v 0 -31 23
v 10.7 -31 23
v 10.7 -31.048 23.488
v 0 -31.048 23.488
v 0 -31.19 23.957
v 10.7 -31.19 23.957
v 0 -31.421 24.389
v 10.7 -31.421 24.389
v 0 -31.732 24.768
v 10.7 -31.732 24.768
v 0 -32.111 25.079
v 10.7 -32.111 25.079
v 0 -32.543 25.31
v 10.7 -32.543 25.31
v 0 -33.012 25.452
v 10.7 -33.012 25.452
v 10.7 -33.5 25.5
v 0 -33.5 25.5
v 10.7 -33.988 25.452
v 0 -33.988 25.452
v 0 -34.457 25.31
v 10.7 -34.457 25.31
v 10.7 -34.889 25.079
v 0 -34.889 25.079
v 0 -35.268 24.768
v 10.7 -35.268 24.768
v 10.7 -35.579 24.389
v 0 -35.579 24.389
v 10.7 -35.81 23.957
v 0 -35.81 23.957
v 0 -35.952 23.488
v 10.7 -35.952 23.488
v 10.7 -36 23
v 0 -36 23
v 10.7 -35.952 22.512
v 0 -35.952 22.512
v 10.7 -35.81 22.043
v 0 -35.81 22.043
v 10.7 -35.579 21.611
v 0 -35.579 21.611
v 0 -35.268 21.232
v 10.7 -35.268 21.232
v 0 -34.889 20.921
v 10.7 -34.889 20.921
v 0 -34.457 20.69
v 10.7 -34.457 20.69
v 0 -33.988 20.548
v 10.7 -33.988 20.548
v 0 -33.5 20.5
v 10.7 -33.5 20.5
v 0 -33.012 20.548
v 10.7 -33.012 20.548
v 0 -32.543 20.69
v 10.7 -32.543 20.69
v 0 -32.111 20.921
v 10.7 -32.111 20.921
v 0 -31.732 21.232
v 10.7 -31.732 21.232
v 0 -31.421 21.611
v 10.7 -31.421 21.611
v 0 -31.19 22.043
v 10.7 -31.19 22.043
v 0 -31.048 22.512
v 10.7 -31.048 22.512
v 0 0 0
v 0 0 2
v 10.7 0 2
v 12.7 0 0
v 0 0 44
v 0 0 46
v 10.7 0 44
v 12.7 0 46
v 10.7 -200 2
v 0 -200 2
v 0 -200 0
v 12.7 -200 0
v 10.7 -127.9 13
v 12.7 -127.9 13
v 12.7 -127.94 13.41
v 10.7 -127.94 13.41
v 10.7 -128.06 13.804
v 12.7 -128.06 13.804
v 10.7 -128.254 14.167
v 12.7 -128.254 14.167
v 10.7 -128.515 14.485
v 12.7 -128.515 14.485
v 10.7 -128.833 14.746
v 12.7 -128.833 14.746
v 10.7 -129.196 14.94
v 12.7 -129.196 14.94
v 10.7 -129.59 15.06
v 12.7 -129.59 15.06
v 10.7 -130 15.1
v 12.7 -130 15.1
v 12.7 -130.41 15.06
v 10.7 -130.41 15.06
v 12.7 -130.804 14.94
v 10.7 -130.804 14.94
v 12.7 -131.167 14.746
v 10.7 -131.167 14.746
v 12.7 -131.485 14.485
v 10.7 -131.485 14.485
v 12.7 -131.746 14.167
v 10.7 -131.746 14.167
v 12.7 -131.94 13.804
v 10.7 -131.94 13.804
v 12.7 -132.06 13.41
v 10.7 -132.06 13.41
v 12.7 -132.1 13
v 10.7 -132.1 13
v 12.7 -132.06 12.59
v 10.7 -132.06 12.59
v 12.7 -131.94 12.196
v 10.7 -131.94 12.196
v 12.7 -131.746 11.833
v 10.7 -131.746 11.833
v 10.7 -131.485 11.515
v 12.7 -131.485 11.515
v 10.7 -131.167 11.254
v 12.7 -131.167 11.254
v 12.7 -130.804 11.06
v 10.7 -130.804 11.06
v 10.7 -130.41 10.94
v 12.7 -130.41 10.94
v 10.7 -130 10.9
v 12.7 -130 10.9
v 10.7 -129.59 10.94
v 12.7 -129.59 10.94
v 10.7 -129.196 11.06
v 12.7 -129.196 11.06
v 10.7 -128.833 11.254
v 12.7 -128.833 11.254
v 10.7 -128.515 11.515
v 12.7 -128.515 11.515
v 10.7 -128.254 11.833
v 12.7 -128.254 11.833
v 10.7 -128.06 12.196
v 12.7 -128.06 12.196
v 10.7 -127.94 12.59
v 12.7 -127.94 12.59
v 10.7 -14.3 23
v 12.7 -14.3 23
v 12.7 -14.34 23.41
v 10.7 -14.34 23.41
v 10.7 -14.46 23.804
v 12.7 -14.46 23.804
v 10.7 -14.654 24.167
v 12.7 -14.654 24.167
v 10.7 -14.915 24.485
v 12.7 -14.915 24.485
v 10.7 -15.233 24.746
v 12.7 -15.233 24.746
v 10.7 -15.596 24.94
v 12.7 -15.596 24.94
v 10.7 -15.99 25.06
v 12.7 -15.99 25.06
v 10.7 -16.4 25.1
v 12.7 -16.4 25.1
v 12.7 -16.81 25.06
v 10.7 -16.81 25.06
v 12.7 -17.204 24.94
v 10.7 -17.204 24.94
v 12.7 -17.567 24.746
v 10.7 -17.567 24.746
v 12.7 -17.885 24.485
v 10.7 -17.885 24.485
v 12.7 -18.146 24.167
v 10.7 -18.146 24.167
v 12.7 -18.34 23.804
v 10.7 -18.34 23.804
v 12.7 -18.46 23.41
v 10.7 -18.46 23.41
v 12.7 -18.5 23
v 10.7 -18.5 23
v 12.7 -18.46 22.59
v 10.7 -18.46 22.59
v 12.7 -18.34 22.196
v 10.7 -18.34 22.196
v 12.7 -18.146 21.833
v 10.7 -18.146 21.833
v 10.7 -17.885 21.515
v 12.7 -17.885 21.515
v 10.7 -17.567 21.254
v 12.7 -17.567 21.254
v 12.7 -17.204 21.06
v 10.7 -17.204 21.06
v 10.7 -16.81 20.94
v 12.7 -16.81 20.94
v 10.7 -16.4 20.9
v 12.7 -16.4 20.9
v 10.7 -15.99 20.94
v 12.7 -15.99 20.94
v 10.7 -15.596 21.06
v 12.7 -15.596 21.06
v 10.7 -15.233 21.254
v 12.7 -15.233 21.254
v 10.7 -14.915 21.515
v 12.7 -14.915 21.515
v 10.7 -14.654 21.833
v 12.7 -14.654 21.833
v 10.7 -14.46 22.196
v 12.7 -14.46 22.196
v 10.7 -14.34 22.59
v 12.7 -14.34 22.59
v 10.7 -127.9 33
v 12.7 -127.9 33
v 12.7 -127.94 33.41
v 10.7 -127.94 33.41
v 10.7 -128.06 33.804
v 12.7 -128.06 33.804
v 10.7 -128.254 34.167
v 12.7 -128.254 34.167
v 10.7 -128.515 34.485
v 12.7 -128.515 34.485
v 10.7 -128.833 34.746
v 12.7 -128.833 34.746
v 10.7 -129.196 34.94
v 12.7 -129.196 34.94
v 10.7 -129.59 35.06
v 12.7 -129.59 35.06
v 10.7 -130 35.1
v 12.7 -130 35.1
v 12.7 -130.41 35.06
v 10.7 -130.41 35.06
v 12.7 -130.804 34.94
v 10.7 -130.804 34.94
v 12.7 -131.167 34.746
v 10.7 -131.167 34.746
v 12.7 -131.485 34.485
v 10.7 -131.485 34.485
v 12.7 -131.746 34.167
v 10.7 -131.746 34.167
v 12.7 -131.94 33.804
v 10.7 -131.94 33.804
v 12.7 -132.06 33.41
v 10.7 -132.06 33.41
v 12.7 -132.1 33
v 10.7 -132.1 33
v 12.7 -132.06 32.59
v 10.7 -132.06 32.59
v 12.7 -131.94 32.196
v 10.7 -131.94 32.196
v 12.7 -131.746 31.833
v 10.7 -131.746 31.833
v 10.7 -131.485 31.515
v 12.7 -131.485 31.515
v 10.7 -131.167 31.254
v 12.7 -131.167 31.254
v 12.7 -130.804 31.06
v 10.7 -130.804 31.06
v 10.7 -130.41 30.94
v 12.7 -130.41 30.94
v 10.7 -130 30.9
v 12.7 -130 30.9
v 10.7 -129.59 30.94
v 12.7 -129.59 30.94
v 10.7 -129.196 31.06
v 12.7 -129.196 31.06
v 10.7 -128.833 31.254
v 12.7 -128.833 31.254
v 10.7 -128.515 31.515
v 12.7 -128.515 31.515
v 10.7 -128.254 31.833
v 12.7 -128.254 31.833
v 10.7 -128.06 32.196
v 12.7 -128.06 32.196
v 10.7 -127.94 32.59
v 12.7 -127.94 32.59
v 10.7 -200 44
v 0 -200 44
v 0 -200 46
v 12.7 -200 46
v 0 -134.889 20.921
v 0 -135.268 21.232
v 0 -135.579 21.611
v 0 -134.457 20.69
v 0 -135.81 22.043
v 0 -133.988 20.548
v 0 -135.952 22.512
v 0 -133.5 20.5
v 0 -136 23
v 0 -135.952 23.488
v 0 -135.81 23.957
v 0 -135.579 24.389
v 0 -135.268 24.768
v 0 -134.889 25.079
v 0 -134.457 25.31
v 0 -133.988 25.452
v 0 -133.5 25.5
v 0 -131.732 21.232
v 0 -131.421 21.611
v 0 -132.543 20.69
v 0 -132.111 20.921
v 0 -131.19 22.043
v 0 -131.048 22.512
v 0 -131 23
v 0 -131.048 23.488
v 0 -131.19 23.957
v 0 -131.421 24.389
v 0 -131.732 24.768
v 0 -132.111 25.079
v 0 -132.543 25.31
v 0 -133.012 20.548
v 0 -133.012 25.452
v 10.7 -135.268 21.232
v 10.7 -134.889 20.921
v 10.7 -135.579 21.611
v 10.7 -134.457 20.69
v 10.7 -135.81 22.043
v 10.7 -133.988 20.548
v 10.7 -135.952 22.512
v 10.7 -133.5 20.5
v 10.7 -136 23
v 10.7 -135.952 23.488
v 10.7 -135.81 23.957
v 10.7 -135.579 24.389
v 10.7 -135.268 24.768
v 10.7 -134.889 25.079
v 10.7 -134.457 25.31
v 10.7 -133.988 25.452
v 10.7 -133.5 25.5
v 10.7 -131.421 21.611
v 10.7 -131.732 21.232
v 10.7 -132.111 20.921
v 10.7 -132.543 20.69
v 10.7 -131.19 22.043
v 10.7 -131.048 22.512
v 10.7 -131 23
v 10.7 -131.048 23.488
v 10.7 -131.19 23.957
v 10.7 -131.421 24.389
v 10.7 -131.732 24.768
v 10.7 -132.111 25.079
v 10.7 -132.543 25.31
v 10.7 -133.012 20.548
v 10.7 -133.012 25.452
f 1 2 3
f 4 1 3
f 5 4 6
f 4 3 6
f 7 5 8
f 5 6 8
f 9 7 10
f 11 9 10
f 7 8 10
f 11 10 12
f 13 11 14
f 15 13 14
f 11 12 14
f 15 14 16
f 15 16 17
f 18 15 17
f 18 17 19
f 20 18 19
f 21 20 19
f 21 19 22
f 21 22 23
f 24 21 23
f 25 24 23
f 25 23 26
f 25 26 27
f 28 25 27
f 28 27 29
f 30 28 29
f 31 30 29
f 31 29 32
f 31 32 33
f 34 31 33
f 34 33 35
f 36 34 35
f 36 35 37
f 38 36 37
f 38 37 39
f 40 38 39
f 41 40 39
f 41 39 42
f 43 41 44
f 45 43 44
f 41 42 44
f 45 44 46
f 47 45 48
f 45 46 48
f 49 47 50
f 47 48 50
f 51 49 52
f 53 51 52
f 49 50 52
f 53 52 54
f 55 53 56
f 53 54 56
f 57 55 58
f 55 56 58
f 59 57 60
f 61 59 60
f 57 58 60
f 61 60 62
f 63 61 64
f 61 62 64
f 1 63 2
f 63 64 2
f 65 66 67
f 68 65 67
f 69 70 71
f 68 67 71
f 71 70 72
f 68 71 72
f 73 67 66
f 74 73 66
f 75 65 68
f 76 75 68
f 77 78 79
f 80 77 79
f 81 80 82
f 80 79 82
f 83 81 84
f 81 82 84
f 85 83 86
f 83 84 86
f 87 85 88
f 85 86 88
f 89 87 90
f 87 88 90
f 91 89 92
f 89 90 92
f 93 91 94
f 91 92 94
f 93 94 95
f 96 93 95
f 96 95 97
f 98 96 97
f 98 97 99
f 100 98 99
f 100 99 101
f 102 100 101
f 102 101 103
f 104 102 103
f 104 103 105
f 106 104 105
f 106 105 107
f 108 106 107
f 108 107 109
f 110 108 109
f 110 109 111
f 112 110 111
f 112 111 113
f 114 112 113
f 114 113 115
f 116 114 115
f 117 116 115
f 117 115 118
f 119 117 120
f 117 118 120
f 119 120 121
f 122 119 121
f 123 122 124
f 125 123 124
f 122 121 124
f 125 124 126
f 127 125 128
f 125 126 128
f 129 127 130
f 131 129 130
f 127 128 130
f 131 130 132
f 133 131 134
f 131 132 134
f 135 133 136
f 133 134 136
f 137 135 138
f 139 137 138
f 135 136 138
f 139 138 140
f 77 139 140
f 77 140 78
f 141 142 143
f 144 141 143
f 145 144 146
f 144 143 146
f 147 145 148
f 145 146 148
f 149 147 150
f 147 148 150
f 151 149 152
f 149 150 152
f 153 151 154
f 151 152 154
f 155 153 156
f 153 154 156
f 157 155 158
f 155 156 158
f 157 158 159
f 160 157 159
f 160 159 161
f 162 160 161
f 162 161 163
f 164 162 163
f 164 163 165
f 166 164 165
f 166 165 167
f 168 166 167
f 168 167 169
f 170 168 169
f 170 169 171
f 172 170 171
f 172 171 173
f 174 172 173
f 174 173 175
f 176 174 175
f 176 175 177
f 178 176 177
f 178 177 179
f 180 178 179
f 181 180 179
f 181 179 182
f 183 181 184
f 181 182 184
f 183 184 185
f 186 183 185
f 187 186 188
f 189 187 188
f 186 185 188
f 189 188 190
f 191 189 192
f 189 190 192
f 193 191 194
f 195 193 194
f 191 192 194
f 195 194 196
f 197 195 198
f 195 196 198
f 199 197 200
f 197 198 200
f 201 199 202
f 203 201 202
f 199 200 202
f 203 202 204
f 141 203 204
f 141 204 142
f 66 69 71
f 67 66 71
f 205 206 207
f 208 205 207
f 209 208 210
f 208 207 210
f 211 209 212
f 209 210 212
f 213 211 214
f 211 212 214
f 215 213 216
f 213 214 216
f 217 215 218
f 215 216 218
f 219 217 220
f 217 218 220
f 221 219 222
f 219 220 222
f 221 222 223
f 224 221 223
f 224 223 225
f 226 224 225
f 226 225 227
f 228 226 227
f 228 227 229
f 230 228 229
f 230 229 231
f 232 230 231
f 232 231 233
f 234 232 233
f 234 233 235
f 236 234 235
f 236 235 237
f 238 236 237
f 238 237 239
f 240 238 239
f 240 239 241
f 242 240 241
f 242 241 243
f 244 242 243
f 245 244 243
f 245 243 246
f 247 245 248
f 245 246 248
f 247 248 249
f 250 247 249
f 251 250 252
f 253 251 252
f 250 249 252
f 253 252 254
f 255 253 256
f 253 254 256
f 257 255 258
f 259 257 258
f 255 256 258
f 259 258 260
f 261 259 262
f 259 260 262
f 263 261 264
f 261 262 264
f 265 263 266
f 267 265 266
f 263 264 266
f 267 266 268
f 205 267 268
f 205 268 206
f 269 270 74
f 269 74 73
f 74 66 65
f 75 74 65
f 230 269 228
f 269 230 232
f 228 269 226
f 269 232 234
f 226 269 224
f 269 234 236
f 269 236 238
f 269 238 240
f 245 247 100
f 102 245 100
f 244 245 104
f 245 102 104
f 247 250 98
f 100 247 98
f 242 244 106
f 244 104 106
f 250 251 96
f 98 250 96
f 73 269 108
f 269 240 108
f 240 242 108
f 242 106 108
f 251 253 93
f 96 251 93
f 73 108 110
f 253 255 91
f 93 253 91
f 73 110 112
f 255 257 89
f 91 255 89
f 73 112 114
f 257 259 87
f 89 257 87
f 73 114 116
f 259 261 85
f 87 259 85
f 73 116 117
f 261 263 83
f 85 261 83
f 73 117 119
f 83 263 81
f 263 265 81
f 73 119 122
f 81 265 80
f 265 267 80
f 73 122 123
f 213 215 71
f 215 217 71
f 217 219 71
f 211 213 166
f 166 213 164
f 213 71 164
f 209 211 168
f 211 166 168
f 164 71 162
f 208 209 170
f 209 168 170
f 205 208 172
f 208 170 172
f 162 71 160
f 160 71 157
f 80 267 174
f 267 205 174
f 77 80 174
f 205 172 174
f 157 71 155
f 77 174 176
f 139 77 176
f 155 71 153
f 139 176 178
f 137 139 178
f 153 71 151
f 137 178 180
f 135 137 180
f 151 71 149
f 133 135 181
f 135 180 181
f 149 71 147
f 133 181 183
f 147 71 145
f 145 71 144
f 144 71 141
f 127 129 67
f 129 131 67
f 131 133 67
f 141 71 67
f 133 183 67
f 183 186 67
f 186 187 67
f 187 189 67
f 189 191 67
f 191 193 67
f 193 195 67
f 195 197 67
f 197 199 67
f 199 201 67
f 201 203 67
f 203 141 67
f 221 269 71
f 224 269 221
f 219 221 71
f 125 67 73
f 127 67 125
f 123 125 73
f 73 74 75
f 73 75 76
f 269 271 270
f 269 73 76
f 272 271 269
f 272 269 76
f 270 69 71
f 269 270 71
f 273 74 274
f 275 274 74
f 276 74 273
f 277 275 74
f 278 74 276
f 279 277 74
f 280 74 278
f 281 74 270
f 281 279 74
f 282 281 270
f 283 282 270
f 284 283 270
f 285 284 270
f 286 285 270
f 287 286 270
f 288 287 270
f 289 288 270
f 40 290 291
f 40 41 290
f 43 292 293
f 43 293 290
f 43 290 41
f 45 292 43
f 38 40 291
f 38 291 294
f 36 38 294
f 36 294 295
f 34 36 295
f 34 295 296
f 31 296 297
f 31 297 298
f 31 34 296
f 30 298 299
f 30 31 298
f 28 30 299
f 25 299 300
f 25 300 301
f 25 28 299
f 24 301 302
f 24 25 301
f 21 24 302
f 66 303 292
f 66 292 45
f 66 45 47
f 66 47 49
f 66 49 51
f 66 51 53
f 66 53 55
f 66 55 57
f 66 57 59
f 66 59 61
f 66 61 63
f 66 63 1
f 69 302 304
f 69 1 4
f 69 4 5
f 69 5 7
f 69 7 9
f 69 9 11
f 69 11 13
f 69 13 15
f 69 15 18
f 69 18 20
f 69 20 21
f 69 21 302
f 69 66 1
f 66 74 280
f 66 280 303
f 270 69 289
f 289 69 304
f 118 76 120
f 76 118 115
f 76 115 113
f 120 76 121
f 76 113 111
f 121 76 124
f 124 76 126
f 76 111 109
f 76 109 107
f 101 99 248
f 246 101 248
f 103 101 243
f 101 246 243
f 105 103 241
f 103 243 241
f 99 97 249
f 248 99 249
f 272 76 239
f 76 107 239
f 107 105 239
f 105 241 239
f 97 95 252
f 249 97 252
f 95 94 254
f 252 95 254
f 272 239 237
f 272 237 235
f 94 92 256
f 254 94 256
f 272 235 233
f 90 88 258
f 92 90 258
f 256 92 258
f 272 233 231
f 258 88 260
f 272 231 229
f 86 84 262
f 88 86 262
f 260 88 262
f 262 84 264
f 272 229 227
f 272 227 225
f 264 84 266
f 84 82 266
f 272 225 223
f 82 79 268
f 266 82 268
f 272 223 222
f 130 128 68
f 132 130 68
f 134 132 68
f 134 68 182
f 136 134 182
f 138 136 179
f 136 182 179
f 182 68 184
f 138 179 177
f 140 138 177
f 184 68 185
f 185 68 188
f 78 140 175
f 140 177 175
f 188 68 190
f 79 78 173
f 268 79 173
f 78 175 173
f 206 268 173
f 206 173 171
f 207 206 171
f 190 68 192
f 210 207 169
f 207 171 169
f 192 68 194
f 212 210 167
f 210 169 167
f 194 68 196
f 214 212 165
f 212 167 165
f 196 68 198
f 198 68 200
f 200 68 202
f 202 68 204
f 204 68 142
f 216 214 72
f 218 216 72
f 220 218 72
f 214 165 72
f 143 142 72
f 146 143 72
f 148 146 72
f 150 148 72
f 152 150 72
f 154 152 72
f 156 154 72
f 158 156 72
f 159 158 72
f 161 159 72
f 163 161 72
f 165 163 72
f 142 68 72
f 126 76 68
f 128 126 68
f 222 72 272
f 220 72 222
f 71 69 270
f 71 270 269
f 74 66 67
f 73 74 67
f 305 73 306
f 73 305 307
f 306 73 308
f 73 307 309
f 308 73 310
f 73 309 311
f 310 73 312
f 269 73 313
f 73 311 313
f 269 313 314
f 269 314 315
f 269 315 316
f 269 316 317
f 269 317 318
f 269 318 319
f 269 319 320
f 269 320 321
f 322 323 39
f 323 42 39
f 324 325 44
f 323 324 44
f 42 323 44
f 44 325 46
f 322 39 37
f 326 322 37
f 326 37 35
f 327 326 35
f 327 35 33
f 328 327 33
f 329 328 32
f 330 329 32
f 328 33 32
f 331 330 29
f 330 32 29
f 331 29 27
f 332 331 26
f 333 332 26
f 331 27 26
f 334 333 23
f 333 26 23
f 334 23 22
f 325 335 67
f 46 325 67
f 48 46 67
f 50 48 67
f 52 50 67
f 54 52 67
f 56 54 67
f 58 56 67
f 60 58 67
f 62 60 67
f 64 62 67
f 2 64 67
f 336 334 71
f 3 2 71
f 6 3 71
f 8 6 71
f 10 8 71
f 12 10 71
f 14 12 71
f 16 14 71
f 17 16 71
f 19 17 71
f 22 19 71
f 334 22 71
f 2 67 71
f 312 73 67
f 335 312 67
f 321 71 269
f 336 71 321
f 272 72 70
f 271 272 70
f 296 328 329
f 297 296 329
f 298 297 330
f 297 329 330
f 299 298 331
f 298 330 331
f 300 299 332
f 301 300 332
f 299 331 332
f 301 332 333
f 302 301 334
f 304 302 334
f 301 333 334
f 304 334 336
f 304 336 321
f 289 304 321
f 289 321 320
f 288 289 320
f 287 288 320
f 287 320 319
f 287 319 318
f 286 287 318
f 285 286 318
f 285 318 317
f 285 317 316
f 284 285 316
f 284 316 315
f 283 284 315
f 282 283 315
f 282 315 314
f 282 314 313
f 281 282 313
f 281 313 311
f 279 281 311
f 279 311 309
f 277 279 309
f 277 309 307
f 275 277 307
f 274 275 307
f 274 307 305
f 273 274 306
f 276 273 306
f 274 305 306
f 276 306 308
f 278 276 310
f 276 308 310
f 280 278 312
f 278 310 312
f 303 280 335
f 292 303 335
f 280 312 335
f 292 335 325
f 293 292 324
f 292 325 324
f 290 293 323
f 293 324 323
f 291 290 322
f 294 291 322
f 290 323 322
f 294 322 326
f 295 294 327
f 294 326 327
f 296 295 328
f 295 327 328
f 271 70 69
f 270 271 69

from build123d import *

# Parameters (mm, degrees)
F0_DEPTH = 200
F5_D     = 4.2
F6_W     = 10.7
F6_H     = 42
F1_DEPTH = 200
F2_D     = 5


with BuildPart() as f0:
    # F3 (on Front) → F0 (new body)
    with BuildSketch(Plane.XZ):
        Polygon((0, 2), (0, 0), (12.7, 0), (12.7, 46), (0, 46), (0, 44), (10.7, 44), (10.7, 2), align=None)
    extrude(amount=F0_DEPTH)

    # F5 (through all)
    with Locations(Plane(origin=(10.7, 0, 0), x_dir=(0, -1, 0), z_dir=(-1, 0, 0))):
        with Locations((130, 13), (130, 33), (16.4, 23)):
            Hole(F5_D / 2)


with BuildPart() as f1:
    # F6 (on Front) → F1 (new body)
    with BuildSketch(Plane.XZ):
        with Locations((5.35, 23)):
            Rectangle(F6_W, F6_H)
    extrude(amount=F1_DEPTH)

    # F2 (through all)
    with Locations(Plane(origin=(0, 0, 0), x_dir=(0, -1, 0), z_dir=(-1, 0, 0))):
        with Locations((133.5, 23), (33.5, 23)):
            Hole(F2_D / 2)


solid = Compound([f0.part, f1.part])
